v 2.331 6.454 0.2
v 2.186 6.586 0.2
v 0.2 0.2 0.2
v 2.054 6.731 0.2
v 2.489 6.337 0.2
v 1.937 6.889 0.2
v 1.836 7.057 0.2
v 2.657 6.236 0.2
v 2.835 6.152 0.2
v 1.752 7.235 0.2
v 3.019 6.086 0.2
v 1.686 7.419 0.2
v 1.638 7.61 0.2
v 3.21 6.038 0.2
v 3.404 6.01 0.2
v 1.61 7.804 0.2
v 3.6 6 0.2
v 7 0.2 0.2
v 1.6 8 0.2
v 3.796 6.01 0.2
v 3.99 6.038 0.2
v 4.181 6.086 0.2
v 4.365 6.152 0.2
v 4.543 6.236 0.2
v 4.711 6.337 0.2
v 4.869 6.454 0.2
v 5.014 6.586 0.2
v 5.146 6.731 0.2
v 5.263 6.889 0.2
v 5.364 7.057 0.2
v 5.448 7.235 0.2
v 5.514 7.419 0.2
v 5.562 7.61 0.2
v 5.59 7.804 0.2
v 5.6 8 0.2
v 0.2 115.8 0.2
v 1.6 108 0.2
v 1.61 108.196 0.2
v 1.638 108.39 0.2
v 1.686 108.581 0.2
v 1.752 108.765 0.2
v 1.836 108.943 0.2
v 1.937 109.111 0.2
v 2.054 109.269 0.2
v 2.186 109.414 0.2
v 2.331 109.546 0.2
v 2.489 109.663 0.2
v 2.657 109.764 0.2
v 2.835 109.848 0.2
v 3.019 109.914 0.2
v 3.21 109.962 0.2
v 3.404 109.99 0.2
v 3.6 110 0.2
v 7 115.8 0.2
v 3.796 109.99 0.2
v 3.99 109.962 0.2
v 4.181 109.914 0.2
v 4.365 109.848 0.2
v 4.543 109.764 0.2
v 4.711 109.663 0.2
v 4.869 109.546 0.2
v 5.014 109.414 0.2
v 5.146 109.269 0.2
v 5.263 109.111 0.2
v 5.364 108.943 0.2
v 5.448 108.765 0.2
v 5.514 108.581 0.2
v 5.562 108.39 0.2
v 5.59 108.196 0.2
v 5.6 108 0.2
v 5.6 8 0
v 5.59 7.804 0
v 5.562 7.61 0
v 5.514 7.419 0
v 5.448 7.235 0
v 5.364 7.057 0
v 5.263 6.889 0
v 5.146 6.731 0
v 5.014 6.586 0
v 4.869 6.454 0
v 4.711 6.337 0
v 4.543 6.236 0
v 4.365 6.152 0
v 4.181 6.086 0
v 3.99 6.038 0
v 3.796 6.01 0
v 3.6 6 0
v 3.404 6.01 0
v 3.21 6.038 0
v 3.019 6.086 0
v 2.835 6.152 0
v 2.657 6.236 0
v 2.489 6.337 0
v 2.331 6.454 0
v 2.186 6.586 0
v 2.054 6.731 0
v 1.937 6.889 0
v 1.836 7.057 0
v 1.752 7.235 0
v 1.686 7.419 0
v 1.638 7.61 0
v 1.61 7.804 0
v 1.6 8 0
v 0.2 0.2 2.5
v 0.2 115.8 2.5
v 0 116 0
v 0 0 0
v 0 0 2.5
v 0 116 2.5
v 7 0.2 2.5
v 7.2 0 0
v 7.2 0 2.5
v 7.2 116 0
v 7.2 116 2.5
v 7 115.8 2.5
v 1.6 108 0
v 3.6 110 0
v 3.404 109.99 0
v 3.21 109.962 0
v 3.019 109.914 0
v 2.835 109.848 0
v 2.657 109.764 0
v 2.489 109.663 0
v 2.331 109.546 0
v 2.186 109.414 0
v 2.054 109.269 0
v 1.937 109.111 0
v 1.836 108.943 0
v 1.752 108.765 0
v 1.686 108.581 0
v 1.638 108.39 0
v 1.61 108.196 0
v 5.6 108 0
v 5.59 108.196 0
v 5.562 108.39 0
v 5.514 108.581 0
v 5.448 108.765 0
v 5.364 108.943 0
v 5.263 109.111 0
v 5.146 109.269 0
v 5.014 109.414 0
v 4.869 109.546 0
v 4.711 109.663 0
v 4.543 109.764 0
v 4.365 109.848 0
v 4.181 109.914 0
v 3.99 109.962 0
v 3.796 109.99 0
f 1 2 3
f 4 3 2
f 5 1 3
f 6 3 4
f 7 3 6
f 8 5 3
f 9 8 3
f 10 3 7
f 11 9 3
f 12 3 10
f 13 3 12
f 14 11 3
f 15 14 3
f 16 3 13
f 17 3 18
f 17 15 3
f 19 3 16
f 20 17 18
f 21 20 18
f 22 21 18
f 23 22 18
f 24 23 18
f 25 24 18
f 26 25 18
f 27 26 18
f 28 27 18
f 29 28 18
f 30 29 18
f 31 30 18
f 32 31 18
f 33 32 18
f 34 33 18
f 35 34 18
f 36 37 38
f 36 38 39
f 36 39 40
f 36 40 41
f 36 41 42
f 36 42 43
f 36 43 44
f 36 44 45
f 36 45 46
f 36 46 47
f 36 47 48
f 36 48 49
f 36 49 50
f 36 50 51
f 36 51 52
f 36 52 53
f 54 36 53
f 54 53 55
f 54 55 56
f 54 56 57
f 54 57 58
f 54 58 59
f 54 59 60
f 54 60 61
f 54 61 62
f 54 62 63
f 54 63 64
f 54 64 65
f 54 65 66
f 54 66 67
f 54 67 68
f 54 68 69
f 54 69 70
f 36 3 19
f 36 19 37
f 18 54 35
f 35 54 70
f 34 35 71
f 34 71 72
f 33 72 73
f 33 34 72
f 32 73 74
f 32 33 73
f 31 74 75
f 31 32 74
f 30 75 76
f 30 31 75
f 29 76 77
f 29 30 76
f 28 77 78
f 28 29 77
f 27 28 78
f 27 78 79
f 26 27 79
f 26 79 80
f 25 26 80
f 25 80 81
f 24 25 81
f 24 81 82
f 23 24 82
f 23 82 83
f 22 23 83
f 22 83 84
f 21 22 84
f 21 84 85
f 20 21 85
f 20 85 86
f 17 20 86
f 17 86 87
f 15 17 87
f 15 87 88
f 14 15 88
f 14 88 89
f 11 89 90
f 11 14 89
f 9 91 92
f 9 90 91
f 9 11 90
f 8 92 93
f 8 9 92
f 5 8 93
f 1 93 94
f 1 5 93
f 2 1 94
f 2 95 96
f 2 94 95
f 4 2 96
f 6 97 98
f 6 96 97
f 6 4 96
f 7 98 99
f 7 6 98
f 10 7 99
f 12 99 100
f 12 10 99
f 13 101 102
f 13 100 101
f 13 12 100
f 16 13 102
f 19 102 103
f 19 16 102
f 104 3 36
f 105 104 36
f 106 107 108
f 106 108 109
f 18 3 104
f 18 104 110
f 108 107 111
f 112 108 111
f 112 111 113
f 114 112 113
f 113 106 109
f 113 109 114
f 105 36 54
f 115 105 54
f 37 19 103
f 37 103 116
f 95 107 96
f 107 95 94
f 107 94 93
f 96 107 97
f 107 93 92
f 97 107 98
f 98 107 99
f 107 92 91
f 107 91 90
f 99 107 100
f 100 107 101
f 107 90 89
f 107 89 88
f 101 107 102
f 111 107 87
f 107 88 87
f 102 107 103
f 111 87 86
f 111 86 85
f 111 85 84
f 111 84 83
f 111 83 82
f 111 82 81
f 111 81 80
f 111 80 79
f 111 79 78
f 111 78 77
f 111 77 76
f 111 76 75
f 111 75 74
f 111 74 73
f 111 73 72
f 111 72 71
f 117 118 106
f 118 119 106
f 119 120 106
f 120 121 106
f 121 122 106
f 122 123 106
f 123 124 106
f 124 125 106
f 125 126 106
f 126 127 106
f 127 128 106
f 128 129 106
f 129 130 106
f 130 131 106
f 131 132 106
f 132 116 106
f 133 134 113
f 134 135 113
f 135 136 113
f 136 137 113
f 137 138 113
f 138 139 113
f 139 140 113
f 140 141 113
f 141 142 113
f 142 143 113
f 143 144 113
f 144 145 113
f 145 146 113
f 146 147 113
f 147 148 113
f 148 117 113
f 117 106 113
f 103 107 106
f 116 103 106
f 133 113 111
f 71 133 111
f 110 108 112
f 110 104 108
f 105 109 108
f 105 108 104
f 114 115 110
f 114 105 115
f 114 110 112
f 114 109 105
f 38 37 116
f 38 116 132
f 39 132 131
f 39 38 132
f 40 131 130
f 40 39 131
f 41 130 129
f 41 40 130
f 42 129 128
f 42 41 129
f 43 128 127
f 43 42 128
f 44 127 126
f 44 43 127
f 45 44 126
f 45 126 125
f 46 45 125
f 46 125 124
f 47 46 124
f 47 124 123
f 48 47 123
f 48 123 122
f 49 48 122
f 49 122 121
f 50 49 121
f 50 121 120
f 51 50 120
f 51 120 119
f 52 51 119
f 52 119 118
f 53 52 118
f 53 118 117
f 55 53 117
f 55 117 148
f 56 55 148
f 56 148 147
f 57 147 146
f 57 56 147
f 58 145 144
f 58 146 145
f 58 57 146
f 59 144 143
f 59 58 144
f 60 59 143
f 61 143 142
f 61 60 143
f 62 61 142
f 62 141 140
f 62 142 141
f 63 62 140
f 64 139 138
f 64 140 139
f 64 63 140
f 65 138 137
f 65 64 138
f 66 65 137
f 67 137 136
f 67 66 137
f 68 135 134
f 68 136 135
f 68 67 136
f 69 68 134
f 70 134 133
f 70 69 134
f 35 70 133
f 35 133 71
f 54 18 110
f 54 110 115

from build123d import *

# Parameters (mm, degrees)
SKETCH_1_W          = 7.2
SKETCH_1_H          = 116
EXTRUDE_1_DEPTH     = 2.5
SHELL_1_T           = -0.2
CUT_EXTRUDE_1_DEPTH = 2.5


with BuildPart() as part:
    # 스케치1 → 보스-돌출1 (new body)
    with BuildSketch(Plane.XY):
        with Locations((3.6, 58)):
            Rectangle(SKETCH_1_W, SKETCH_1_H)
    extrude(amount=EXTRUDE_1_DEPTH)

    # 쉘1
    shell_1_openings = [part.faces().sort_by_distance(p)[0] for p in [
        (3.6, 58, 2.5),
    ]]
    offset(amount=SHELL_1_T, openings=shell_1_openings, kind=Kind.INTERSECTION)

    # 스케치2 → 컷-돌출1 (cut)
    with BuildSketch(Plane.XY.offset(0.2)):
        with BuildLine():
            Line((5.6, 108), (5.6, 8))
            ThreePointArc((5.6, 8), (3.6, 6), (1.6, 8))
            Line((1.6, 8), (1.6, 108))
            ThreePointArc((1.6, 108), (3.6, 110), (5.6, 108))
        make_face()
    extrude(amount=-CUT_EXTRUDE_1_DEPTH, mode=Mode.SUBTRACT)


solid = part.part
